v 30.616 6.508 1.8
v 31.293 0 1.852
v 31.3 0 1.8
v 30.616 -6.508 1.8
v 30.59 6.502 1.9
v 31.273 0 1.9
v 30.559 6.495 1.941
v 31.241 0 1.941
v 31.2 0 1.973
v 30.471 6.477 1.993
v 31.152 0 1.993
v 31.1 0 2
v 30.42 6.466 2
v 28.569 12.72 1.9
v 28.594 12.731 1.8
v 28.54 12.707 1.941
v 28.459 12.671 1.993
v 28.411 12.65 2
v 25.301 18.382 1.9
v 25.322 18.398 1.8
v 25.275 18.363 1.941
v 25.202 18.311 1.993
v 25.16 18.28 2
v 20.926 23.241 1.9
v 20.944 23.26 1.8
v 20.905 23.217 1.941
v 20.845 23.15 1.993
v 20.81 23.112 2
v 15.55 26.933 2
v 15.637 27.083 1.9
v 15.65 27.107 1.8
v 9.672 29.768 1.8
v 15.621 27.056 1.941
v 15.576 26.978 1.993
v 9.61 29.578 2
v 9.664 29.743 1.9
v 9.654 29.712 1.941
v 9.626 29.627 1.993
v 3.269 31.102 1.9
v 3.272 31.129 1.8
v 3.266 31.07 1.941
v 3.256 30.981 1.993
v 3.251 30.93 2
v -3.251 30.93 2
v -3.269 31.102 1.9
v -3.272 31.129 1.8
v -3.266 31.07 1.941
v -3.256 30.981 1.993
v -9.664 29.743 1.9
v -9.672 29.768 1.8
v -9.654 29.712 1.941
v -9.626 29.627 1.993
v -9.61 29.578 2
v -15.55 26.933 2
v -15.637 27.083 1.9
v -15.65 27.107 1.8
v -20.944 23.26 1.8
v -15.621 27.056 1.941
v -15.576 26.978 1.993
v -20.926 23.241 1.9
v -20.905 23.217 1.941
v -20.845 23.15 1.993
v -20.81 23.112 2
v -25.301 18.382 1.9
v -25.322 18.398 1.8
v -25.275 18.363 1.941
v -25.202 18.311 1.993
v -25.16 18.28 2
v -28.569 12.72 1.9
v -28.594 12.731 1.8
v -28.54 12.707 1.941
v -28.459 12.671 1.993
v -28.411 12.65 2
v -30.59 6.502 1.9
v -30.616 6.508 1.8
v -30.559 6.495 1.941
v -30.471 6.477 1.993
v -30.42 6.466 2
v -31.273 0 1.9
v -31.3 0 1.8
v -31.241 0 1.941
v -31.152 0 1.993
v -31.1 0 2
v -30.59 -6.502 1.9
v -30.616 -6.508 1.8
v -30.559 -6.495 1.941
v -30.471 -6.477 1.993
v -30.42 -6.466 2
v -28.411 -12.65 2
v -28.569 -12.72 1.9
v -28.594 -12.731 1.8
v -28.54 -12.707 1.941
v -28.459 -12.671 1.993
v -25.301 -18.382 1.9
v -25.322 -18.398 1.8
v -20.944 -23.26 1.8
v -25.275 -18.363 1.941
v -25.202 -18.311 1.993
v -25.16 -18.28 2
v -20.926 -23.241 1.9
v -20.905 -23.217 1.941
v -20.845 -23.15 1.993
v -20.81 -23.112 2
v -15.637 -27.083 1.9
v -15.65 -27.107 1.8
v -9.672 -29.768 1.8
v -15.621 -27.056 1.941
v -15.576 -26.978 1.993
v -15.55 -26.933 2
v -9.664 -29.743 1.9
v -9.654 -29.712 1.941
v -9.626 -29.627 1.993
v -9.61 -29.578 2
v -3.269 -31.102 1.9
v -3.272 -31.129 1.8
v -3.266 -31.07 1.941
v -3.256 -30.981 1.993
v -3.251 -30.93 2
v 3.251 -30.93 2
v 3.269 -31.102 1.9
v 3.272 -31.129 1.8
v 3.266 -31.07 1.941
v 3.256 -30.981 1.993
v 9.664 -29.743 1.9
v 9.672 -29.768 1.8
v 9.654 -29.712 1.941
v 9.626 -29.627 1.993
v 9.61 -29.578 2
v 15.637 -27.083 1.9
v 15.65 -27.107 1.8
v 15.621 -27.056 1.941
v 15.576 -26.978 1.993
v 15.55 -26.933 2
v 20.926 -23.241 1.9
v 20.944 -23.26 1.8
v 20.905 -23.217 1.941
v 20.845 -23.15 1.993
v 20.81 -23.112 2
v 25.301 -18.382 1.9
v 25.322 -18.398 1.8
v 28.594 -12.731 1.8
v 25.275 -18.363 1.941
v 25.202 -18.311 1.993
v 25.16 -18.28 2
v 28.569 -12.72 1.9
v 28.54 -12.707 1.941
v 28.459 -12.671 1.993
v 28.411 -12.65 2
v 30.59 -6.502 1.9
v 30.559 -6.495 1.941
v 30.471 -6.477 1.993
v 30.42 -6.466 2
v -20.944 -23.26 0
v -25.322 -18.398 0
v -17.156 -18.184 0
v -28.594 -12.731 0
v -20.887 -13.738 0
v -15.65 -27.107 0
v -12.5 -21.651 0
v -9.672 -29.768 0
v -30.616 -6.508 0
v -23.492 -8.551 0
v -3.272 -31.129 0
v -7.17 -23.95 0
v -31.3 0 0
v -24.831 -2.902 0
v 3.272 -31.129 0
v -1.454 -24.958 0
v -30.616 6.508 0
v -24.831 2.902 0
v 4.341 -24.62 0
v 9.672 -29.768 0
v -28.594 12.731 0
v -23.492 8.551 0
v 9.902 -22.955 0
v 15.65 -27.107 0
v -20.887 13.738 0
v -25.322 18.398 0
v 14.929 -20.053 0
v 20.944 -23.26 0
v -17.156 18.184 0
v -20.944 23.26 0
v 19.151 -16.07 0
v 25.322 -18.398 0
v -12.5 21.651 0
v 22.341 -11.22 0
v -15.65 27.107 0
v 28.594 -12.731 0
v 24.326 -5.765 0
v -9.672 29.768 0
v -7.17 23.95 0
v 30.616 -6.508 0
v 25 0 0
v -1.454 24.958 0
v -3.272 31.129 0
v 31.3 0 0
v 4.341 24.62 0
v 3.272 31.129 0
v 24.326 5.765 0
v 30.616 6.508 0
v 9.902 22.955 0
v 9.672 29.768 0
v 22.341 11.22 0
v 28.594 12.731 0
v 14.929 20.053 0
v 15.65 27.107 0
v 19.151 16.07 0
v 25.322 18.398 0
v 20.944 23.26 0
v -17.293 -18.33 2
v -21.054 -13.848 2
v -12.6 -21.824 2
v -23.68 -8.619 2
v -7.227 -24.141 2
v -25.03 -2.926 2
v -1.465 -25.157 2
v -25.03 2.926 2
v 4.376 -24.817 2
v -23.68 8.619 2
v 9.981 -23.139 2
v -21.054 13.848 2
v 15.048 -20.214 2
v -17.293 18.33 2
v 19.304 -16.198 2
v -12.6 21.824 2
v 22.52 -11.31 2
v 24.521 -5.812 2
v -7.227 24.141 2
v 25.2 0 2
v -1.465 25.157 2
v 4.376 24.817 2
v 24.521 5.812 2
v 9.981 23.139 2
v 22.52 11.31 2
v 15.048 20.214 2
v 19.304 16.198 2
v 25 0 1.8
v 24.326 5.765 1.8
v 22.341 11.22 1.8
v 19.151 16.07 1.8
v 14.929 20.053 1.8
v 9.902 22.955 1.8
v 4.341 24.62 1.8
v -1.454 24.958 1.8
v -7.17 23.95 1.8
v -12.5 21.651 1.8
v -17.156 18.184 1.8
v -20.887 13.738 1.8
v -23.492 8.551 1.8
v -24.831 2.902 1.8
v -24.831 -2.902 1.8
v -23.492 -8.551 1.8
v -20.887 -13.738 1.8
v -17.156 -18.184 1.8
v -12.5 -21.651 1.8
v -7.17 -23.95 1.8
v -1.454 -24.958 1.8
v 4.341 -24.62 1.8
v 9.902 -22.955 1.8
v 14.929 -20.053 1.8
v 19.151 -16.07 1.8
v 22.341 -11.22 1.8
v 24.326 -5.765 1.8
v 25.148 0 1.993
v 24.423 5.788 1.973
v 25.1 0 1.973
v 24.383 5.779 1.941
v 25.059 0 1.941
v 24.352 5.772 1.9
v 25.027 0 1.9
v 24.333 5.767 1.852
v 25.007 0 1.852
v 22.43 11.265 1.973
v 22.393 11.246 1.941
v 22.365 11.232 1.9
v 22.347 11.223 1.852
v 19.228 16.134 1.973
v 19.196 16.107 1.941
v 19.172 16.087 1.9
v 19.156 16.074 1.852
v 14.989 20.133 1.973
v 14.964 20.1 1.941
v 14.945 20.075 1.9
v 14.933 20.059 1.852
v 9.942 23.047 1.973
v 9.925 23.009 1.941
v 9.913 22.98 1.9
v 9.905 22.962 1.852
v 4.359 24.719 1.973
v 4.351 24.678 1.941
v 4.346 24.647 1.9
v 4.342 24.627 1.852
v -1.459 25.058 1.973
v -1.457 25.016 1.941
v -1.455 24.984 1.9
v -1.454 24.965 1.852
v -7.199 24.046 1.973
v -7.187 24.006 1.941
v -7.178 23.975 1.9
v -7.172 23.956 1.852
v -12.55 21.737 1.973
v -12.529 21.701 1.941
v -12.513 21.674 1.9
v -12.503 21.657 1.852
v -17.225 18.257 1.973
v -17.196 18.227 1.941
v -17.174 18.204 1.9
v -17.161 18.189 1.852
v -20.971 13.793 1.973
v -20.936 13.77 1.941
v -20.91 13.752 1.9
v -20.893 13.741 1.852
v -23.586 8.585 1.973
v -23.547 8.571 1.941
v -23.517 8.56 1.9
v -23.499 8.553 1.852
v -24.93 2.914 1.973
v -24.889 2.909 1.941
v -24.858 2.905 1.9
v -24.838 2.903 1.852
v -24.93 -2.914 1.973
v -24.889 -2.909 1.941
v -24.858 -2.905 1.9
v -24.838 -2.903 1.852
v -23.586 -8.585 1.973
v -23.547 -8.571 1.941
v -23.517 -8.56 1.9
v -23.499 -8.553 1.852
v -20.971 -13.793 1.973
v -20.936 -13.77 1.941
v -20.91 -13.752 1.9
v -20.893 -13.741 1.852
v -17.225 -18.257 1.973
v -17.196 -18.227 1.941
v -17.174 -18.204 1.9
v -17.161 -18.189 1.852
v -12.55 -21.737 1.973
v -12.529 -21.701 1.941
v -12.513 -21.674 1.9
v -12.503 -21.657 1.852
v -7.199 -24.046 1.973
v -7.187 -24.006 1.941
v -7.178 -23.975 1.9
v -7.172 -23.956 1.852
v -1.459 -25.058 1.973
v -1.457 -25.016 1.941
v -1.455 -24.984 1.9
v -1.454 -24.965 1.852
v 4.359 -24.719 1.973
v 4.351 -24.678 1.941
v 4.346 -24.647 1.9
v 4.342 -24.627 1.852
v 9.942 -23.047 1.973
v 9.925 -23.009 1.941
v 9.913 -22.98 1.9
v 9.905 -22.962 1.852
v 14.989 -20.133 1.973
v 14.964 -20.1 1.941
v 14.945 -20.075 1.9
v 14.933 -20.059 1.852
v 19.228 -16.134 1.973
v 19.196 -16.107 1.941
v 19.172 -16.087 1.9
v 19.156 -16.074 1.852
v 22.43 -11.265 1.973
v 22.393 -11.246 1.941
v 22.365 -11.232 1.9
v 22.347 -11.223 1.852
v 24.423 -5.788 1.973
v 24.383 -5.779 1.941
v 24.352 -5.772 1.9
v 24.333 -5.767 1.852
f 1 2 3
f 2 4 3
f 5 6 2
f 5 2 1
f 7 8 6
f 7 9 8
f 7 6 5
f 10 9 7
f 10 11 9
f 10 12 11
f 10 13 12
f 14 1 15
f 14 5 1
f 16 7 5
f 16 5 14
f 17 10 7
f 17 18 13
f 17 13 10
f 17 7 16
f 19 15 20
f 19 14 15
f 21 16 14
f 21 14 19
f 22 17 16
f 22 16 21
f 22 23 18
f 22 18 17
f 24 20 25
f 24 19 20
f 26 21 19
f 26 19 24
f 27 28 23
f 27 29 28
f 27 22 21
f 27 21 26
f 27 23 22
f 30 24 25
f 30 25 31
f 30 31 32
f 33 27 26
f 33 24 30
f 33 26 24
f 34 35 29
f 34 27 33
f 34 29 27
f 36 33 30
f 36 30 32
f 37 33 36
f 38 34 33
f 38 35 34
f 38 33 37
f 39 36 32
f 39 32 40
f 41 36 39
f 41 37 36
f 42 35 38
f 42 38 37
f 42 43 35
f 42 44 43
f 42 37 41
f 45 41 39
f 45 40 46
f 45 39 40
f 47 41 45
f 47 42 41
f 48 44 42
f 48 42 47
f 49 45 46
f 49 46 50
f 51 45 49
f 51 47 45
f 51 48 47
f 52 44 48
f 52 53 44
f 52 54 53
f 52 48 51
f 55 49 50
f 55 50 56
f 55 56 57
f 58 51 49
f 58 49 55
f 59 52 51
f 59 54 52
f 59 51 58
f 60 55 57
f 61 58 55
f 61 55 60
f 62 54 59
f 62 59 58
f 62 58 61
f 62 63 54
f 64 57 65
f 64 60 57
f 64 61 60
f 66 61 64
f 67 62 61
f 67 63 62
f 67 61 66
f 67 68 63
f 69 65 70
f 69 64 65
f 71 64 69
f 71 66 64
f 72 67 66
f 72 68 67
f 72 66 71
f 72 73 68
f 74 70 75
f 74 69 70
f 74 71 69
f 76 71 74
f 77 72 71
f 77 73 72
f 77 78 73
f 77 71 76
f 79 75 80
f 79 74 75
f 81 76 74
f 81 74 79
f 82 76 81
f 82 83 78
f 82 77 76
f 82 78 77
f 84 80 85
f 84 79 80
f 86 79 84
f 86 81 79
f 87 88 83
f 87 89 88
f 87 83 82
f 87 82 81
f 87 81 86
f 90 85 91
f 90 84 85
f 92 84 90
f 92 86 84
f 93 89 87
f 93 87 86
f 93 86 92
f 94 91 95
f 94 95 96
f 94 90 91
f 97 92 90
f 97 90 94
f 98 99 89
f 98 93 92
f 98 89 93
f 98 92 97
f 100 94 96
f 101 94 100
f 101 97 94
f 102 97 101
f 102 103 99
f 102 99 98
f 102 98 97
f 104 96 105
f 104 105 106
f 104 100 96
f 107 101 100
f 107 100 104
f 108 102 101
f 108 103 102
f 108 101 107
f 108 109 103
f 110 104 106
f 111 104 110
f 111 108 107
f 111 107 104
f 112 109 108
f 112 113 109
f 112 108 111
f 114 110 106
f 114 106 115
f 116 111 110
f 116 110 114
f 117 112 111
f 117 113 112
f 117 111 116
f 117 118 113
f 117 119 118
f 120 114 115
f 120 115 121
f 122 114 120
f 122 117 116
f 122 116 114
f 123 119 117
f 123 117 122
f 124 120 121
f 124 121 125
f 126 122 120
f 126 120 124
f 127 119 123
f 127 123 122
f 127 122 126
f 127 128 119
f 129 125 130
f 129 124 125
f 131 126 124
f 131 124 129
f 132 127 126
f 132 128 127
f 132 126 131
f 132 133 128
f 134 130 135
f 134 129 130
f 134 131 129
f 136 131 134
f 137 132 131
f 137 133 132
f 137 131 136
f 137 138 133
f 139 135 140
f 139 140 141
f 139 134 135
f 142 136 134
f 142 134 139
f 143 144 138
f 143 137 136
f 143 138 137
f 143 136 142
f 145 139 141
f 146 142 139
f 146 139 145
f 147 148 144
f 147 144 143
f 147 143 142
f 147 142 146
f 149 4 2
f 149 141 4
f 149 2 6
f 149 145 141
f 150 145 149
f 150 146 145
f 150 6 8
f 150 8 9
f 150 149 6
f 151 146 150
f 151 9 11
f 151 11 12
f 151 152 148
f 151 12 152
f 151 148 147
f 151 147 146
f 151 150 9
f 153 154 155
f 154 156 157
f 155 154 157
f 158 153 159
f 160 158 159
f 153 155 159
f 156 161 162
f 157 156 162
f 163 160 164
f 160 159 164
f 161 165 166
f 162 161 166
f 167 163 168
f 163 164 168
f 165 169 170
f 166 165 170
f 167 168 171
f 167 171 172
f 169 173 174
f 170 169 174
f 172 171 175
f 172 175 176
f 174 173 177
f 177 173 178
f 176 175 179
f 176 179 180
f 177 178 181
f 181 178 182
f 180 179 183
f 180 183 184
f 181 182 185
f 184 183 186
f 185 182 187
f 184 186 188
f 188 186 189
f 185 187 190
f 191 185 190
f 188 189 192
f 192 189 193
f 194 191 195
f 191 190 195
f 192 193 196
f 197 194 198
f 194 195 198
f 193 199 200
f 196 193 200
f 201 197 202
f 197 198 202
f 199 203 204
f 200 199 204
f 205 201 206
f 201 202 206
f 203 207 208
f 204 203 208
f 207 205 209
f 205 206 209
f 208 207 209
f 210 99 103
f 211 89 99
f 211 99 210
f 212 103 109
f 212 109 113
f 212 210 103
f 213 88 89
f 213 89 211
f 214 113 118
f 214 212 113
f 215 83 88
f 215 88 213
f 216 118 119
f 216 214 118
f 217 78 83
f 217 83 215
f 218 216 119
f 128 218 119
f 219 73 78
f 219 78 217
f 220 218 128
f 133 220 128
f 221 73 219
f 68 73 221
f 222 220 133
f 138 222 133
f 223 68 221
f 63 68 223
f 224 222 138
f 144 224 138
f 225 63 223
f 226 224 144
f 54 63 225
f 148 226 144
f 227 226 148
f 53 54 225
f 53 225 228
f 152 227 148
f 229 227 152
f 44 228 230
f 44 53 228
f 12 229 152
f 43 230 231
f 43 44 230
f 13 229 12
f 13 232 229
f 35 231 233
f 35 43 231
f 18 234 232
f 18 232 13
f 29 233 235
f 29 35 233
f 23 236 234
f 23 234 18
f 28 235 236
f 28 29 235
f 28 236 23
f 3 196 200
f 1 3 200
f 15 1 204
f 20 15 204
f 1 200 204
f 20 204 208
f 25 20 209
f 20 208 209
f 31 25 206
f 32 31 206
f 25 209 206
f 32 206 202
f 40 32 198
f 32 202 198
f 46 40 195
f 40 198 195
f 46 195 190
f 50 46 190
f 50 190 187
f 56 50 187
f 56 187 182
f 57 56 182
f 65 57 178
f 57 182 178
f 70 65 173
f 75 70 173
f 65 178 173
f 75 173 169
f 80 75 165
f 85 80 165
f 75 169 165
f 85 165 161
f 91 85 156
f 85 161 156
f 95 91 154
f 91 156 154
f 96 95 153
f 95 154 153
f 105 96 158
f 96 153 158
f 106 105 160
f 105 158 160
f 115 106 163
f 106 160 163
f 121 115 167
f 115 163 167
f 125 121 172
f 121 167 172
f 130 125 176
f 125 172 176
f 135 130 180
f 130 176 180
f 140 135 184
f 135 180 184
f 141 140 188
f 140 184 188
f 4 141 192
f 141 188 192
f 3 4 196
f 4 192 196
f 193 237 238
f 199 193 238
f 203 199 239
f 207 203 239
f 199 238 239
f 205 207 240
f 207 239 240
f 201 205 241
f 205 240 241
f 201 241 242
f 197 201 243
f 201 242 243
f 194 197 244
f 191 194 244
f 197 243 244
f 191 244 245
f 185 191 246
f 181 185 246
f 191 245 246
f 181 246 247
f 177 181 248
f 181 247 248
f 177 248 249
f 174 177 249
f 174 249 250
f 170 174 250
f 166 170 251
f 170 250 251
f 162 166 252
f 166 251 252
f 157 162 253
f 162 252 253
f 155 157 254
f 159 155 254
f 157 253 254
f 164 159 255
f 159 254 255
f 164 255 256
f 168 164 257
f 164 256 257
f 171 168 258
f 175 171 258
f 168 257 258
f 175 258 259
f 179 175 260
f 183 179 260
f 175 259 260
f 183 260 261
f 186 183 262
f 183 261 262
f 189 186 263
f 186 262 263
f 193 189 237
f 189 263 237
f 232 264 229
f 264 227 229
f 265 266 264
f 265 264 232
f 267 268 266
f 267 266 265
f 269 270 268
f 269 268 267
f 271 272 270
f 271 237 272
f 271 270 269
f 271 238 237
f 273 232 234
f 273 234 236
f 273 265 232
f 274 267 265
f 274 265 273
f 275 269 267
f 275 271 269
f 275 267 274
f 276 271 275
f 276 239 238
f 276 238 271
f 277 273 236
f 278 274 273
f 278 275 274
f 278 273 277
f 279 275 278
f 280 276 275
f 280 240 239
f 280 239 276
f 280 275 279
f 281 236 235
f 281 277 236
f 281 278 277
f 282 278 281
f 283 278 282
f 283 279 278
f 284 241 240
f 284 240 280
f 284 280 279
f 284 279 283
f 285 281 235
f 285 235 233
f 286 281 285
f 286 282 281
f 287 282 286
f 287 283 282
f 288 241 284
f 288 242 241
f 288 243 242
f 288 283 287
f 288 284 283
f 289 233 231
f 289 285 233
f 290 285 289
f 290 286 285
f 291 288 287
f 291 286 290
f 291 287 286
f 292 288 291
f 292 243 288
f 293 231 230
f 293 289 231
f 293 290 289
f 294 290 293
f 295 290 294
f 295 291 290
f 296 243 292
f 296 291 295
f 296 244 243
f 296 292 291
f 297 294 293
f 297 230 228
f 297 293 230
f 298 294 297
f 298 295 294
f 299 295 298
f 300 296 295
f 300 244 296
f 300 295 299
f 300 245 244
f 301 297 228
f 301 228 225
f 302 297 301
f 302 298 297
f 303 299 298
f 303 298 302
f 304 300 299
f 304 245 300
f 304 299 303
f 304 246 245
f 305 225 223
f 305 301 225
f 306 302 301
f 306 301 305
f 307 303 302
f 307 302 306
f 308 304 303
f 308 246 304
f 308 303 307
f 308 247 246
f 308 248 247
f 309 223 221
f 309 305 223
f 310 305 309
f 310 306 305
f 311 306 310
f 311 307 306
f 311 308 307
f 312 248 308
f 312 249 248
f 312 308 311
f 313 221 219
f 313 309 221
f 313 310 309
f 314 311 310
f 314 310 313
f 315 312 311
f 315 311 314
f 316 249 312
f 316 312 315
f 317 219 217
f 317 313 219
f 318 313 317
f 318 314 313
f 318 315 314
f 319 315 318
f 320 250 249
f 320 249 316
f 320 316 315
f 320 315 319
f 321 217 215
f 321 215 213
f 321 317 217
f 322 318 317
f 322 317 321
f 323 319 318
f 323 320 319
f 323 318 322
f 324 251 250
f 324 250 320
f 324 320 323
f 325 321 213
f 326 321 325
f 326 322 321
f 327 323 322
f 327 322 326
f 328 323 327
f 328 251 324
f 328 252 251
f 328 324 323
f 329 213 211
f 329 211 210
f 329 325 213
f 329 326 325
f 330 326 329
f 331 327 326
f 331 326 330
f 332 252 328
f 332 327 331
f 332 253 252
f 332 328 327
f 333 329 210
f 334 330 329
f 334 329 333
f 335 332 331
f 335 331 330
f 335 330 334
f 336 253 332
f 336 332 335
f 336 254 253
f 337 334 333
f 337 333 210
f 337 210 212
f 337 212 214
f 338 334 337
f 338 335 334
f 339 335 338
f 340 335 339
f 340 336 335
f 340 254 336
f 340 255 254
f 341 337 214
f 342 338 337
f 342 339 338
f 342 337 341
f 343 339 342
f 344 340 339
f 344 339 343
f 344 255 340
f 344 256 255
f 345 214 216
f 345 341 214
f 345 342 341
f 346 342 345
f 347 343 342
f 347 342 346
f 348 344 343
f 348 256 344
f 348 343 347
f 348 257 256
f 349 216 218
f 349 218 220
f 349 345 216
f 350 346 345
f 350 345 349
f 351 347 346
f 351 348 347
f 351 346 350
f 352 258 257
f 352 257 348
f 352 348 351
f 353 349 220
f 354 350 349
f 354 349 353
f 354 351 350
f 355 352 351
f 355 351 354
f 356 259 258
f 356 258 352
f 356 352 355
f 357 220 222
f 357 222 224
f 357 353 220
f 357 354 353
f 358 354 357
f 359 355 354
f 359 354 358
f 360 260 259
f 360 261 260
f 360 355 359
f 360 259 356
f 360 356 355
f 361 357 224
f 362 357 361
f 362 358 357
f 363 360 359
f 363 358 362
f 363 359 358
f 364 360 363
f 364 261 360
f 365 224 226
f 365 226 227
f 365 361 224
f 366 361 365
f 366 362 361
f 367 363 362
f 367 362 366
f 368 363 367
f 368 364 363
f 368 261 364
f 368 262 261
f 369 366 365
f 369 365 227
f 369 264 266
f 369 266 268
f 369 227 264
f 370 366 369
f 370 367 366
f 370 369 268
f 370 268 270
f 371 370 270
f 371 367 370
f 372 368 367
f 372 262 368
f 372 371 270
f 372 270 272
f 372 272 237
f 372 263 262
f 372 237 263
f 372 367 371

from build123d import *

# Parameters (mm, degrees)
F0_R     = 31.3
F1_DEPTH = 2
F2_R     = 25
F3_DEPTH = 2
F4_R     = 0.2


with BuildPart() as f1:
    # F0 (on Top) → F1 (new body)
    with BuildSketch(Plane.XY):
        Circle(F0_R)
    extrude(amount=F1_DEPTH)

    # F2 (on face) → F3 (cut)
    with BuildSketch(Plane.XY.offset(2)):
        Circle(F2_R)
    extrude(amount=-F3_DEPTH, mode=Mode.SUBTRACT)

    # F4
    f4_edges = [f1.edges().sort_by_distance(p)[0] for p in [
        (-31.3, 0, 2),
        (-25, 0, 2),
    ]]
    fillet(f4_edges, radius=F4_R)


solid = f1.part
